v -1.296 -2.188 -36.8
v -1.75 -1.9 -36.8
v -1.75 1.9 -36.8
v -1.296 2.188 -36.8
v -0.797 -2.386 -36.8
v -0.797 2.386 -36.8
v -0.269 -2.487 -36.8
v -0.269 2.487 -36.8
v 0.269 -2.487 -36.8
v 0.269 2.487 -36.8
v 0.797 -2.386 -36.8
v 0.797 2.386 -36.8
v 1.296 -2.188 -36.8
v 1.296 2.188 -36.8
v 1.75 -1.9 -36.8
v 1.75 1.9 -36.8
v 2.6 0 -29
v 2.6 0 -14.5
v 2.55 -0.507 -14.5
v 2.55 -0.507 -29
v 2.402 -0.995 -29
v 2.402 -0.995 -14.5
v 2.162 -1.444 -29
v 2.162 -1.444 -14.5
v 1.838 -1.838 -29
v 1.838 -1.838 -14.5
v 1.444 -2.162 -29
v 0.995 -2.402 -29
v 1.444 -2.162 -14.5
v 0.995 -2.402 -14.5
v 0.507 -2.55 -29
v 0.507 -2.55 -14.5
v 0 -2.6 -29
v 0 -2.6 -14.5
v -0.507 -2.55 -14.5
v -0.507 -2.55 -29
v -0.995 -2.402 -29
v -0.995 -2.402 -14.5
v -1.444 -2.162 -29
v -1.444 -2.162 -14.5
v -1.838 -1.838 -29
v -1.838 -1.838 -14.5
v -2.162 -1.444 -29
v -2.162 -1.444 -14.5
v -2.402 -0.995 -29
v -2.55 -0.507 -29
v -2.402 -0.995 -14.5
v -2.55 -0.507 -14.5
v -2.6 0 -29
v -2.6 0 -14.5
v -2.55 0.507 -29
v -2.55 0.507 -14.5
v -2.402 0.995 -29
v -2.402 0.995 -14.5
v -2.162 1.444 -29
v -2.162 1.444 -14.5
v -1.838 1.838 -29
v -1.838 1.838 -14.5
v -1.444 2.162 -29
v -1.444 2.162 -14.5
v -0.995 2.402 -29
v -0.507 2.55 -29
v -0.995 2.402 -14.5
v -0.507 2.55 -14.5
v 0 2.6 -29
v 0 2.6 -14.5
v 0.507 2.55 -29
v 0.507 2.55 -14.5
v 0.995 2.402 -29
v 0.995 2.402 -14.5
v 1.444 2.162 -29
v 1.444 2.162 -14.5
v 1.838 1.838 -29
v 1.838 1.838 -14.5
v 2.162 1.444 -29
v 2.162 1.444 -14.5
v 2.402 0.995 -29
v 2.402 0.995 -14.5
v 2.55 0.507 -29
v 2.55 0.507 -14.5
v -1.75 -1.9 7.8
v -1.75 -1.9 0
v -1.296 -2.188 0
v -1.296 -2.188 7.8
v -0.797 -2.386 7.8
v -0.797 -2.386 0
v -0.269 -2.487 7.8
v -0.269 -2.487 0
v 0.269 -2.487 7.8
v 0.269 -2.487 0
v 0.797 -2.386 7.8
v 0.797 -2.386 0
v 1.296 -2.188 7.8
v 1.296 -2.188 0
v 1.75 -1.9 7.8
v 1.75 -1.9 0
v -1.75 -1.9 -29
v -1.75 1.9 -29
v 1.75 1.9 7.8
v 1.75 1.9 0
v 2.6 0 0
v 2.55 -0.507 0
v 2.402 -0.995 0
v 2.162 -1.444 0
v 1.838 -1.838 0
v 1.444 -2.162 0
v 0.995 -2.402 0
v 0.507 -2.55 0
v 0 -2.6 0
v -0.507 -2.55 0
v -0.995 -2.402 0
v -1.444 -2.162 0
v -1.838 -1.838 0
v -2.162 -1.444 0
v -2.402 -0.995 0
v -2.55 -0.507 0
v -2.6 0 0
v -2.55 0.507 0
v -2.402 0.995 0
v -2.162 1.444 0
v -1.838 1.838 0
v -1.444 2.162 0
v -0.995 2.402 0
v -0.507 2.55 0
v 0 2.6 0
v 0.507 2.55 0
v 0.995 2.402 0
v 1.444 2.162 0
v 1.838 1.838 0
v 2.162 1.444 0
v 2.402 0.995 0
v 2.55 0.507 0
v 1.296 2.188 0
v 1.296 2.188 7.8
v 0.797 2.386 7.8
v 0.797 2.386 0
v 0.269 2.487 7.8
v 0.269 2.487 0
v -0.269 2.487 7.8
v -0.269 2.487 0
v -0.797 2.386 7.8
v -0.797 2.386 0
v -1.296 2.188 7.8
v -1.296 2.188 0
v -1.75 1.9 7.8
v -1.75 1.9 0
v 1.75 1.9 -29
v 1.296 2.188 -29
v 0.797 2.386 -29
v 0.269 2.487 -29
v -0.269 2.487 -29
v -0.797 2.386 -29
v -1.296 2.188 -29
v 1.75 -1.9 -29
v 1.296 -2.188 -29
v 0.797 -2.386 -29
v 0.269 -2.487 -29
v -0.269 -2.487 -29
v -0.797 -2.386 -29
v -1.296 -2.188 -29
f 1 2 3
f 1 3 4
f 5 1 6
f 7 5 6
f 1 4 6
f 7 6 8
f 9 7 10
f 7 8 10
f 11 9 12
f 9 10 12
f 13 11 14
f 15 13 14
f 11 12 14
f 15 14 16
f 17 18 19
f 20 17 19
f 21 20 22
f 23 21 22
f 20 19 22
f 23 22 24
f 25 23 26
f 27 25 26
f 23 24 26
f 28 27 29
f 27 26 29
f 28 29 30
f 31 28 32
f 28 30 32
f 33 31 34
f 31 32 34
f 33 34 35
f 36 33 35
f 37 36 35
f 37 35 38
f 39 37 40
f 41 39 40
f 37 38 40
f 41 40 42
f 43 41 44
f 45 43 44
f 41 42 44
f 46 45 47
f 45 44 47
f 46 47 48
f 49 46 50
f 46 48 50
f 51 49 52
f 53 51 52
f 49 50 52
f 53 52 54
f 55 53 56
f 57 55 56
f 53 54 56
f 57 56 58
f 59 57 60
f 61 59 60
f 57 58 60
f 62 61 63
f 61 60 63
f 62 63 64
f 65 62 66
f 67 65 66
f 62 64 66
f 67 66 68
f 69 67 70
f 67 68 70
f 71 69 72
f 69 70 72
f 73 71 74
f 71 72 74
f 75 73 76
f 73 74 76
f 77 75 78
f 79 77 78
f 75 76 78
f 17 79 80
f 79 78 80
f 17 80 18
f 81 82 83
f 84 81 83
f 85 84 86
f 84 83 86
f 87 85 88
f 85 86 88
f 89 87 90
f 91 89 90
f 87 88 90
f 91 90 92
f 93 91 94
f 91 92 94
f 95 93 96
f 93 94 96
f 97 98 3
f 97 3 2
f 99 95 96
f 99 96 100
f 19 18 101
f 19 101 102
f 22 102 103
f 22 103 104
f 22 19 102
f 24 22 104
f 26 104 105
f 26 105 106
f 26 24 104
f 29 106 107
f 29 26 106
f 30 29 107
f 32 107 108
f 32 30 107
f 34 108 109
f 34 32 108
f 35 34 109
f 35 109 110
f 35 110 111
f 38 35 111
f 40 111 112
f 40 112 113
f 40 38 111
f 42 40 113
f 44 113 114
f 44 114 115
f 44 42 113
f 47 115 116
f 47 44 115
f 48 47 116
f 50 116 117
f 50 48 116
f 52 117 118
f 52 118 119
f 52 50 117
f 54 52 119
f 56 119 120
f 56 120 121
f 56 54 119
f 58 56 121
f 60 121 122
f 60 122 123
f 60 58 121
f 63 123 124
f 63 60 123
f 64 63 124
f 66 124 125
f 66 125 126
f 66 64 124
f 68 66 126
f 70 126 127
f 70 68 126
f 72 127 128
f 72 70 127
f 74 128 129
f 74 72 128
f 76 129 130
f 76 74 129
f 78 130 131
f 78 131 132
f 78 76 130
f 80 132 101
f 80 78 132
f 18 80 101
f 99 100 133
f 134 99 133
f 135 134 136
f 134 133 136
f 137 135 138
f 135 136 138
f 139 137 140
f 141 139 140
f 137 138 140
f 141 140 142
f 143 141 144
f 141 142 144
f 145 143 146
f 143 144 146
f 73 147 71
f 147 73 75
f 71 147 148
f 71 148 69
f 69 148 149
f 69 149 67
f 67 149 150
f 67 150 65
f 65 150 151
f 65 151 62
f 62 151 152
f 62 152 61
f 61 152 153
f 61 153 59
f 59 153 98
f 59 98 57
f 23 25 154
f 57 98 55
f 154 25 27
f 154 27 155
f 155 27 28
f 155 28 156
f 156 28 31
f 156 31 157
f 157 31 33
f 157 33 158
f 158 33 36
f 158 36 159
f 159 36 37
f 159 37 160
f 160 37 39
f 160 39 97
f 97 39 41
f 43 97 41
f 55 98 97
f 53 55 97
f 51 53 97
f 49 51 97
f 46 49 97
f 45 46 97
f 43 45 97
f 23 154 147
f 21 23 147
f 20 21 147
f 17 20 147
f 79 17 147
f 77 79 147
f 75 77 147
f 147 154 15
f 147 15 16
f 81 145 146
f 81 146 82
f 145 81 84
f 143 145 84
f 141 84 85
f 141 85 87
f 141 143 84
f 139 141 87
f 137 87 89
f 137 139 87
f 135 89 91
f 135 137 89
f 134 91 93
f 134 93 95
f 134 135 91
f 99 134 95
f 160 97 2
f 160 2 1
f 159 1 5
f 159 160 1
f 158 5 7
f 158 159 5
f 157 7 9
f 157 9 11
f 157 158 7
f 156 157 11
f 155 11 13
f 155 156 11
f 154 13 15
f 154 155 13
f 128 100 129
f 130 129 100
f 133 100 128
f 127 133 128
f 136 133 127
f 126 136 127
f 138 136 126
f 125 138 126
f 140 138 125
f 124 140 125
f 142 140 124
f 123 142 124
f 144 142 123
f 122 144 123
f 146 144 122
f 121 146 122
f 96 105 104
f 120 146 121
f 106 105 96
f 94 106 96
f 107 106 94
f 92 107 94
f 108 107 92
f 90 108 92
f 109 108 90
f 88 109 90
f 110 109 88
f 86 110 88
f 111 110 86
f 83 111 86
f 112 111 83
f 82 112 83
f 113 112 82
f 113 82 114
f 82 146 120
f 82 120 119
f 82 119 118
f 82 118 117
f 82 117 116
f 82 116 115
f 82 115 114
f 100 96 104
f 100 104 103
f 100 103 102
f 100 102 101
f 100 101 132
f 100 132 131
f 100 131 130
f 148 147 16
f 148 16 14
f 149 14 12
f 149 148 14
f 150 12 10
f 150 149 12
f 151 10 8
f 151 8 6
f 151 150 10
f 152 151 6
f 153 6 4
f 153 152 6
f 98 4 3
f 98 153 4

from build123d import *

# Parameters (mm, degrees)
SKETCH_1_W      = 2.6
SKETCH_1_H      = 14.5
EXTRUDE_1_DEPTH = 7.8


with BuildPart() as part:
    # 草图1 → 旋转1 (revolve)
    with BuildSketch(Plane(origin=(0, 0, 0), x_dir=(1, 0, 0), z_dir=(0, 1, 0))):
        with Locations((1.3, 7.25)):
            Rectangle(SKETCH_1_W, SKETCH_1_H)
    revolve(axis=Axis((0, 0, 0), (0, 0, -1)))

    # 草图2 → 凸台-拉伸1 (add)
    with BuildSketch(Plane.XY):
        with BuildLine():
            Line((-1.75, 1.9), (-1.75, -1.9))
            ThreePointArc((-1.75, -1.9), (0, -2.5), (1.75, -1.9))
            Line((1.75, -1.9), (1.75, 1.9))
            ThreePointArc((1.75, 1.9), (0, 2.5), (-1.75, 1.9))
        make_face()
    extrude(amount=EXTRUDE_1_DEPTH)

    # 镜向1: part across plane


with BuildPart() as part_1:
    add(part.part)
    add(part.part.mirror(Plane(origin=(0, 0, -14.5), x_dir=(1, 0, 0), z_dir=(0, 0, -1))))


solid = part_1.part
